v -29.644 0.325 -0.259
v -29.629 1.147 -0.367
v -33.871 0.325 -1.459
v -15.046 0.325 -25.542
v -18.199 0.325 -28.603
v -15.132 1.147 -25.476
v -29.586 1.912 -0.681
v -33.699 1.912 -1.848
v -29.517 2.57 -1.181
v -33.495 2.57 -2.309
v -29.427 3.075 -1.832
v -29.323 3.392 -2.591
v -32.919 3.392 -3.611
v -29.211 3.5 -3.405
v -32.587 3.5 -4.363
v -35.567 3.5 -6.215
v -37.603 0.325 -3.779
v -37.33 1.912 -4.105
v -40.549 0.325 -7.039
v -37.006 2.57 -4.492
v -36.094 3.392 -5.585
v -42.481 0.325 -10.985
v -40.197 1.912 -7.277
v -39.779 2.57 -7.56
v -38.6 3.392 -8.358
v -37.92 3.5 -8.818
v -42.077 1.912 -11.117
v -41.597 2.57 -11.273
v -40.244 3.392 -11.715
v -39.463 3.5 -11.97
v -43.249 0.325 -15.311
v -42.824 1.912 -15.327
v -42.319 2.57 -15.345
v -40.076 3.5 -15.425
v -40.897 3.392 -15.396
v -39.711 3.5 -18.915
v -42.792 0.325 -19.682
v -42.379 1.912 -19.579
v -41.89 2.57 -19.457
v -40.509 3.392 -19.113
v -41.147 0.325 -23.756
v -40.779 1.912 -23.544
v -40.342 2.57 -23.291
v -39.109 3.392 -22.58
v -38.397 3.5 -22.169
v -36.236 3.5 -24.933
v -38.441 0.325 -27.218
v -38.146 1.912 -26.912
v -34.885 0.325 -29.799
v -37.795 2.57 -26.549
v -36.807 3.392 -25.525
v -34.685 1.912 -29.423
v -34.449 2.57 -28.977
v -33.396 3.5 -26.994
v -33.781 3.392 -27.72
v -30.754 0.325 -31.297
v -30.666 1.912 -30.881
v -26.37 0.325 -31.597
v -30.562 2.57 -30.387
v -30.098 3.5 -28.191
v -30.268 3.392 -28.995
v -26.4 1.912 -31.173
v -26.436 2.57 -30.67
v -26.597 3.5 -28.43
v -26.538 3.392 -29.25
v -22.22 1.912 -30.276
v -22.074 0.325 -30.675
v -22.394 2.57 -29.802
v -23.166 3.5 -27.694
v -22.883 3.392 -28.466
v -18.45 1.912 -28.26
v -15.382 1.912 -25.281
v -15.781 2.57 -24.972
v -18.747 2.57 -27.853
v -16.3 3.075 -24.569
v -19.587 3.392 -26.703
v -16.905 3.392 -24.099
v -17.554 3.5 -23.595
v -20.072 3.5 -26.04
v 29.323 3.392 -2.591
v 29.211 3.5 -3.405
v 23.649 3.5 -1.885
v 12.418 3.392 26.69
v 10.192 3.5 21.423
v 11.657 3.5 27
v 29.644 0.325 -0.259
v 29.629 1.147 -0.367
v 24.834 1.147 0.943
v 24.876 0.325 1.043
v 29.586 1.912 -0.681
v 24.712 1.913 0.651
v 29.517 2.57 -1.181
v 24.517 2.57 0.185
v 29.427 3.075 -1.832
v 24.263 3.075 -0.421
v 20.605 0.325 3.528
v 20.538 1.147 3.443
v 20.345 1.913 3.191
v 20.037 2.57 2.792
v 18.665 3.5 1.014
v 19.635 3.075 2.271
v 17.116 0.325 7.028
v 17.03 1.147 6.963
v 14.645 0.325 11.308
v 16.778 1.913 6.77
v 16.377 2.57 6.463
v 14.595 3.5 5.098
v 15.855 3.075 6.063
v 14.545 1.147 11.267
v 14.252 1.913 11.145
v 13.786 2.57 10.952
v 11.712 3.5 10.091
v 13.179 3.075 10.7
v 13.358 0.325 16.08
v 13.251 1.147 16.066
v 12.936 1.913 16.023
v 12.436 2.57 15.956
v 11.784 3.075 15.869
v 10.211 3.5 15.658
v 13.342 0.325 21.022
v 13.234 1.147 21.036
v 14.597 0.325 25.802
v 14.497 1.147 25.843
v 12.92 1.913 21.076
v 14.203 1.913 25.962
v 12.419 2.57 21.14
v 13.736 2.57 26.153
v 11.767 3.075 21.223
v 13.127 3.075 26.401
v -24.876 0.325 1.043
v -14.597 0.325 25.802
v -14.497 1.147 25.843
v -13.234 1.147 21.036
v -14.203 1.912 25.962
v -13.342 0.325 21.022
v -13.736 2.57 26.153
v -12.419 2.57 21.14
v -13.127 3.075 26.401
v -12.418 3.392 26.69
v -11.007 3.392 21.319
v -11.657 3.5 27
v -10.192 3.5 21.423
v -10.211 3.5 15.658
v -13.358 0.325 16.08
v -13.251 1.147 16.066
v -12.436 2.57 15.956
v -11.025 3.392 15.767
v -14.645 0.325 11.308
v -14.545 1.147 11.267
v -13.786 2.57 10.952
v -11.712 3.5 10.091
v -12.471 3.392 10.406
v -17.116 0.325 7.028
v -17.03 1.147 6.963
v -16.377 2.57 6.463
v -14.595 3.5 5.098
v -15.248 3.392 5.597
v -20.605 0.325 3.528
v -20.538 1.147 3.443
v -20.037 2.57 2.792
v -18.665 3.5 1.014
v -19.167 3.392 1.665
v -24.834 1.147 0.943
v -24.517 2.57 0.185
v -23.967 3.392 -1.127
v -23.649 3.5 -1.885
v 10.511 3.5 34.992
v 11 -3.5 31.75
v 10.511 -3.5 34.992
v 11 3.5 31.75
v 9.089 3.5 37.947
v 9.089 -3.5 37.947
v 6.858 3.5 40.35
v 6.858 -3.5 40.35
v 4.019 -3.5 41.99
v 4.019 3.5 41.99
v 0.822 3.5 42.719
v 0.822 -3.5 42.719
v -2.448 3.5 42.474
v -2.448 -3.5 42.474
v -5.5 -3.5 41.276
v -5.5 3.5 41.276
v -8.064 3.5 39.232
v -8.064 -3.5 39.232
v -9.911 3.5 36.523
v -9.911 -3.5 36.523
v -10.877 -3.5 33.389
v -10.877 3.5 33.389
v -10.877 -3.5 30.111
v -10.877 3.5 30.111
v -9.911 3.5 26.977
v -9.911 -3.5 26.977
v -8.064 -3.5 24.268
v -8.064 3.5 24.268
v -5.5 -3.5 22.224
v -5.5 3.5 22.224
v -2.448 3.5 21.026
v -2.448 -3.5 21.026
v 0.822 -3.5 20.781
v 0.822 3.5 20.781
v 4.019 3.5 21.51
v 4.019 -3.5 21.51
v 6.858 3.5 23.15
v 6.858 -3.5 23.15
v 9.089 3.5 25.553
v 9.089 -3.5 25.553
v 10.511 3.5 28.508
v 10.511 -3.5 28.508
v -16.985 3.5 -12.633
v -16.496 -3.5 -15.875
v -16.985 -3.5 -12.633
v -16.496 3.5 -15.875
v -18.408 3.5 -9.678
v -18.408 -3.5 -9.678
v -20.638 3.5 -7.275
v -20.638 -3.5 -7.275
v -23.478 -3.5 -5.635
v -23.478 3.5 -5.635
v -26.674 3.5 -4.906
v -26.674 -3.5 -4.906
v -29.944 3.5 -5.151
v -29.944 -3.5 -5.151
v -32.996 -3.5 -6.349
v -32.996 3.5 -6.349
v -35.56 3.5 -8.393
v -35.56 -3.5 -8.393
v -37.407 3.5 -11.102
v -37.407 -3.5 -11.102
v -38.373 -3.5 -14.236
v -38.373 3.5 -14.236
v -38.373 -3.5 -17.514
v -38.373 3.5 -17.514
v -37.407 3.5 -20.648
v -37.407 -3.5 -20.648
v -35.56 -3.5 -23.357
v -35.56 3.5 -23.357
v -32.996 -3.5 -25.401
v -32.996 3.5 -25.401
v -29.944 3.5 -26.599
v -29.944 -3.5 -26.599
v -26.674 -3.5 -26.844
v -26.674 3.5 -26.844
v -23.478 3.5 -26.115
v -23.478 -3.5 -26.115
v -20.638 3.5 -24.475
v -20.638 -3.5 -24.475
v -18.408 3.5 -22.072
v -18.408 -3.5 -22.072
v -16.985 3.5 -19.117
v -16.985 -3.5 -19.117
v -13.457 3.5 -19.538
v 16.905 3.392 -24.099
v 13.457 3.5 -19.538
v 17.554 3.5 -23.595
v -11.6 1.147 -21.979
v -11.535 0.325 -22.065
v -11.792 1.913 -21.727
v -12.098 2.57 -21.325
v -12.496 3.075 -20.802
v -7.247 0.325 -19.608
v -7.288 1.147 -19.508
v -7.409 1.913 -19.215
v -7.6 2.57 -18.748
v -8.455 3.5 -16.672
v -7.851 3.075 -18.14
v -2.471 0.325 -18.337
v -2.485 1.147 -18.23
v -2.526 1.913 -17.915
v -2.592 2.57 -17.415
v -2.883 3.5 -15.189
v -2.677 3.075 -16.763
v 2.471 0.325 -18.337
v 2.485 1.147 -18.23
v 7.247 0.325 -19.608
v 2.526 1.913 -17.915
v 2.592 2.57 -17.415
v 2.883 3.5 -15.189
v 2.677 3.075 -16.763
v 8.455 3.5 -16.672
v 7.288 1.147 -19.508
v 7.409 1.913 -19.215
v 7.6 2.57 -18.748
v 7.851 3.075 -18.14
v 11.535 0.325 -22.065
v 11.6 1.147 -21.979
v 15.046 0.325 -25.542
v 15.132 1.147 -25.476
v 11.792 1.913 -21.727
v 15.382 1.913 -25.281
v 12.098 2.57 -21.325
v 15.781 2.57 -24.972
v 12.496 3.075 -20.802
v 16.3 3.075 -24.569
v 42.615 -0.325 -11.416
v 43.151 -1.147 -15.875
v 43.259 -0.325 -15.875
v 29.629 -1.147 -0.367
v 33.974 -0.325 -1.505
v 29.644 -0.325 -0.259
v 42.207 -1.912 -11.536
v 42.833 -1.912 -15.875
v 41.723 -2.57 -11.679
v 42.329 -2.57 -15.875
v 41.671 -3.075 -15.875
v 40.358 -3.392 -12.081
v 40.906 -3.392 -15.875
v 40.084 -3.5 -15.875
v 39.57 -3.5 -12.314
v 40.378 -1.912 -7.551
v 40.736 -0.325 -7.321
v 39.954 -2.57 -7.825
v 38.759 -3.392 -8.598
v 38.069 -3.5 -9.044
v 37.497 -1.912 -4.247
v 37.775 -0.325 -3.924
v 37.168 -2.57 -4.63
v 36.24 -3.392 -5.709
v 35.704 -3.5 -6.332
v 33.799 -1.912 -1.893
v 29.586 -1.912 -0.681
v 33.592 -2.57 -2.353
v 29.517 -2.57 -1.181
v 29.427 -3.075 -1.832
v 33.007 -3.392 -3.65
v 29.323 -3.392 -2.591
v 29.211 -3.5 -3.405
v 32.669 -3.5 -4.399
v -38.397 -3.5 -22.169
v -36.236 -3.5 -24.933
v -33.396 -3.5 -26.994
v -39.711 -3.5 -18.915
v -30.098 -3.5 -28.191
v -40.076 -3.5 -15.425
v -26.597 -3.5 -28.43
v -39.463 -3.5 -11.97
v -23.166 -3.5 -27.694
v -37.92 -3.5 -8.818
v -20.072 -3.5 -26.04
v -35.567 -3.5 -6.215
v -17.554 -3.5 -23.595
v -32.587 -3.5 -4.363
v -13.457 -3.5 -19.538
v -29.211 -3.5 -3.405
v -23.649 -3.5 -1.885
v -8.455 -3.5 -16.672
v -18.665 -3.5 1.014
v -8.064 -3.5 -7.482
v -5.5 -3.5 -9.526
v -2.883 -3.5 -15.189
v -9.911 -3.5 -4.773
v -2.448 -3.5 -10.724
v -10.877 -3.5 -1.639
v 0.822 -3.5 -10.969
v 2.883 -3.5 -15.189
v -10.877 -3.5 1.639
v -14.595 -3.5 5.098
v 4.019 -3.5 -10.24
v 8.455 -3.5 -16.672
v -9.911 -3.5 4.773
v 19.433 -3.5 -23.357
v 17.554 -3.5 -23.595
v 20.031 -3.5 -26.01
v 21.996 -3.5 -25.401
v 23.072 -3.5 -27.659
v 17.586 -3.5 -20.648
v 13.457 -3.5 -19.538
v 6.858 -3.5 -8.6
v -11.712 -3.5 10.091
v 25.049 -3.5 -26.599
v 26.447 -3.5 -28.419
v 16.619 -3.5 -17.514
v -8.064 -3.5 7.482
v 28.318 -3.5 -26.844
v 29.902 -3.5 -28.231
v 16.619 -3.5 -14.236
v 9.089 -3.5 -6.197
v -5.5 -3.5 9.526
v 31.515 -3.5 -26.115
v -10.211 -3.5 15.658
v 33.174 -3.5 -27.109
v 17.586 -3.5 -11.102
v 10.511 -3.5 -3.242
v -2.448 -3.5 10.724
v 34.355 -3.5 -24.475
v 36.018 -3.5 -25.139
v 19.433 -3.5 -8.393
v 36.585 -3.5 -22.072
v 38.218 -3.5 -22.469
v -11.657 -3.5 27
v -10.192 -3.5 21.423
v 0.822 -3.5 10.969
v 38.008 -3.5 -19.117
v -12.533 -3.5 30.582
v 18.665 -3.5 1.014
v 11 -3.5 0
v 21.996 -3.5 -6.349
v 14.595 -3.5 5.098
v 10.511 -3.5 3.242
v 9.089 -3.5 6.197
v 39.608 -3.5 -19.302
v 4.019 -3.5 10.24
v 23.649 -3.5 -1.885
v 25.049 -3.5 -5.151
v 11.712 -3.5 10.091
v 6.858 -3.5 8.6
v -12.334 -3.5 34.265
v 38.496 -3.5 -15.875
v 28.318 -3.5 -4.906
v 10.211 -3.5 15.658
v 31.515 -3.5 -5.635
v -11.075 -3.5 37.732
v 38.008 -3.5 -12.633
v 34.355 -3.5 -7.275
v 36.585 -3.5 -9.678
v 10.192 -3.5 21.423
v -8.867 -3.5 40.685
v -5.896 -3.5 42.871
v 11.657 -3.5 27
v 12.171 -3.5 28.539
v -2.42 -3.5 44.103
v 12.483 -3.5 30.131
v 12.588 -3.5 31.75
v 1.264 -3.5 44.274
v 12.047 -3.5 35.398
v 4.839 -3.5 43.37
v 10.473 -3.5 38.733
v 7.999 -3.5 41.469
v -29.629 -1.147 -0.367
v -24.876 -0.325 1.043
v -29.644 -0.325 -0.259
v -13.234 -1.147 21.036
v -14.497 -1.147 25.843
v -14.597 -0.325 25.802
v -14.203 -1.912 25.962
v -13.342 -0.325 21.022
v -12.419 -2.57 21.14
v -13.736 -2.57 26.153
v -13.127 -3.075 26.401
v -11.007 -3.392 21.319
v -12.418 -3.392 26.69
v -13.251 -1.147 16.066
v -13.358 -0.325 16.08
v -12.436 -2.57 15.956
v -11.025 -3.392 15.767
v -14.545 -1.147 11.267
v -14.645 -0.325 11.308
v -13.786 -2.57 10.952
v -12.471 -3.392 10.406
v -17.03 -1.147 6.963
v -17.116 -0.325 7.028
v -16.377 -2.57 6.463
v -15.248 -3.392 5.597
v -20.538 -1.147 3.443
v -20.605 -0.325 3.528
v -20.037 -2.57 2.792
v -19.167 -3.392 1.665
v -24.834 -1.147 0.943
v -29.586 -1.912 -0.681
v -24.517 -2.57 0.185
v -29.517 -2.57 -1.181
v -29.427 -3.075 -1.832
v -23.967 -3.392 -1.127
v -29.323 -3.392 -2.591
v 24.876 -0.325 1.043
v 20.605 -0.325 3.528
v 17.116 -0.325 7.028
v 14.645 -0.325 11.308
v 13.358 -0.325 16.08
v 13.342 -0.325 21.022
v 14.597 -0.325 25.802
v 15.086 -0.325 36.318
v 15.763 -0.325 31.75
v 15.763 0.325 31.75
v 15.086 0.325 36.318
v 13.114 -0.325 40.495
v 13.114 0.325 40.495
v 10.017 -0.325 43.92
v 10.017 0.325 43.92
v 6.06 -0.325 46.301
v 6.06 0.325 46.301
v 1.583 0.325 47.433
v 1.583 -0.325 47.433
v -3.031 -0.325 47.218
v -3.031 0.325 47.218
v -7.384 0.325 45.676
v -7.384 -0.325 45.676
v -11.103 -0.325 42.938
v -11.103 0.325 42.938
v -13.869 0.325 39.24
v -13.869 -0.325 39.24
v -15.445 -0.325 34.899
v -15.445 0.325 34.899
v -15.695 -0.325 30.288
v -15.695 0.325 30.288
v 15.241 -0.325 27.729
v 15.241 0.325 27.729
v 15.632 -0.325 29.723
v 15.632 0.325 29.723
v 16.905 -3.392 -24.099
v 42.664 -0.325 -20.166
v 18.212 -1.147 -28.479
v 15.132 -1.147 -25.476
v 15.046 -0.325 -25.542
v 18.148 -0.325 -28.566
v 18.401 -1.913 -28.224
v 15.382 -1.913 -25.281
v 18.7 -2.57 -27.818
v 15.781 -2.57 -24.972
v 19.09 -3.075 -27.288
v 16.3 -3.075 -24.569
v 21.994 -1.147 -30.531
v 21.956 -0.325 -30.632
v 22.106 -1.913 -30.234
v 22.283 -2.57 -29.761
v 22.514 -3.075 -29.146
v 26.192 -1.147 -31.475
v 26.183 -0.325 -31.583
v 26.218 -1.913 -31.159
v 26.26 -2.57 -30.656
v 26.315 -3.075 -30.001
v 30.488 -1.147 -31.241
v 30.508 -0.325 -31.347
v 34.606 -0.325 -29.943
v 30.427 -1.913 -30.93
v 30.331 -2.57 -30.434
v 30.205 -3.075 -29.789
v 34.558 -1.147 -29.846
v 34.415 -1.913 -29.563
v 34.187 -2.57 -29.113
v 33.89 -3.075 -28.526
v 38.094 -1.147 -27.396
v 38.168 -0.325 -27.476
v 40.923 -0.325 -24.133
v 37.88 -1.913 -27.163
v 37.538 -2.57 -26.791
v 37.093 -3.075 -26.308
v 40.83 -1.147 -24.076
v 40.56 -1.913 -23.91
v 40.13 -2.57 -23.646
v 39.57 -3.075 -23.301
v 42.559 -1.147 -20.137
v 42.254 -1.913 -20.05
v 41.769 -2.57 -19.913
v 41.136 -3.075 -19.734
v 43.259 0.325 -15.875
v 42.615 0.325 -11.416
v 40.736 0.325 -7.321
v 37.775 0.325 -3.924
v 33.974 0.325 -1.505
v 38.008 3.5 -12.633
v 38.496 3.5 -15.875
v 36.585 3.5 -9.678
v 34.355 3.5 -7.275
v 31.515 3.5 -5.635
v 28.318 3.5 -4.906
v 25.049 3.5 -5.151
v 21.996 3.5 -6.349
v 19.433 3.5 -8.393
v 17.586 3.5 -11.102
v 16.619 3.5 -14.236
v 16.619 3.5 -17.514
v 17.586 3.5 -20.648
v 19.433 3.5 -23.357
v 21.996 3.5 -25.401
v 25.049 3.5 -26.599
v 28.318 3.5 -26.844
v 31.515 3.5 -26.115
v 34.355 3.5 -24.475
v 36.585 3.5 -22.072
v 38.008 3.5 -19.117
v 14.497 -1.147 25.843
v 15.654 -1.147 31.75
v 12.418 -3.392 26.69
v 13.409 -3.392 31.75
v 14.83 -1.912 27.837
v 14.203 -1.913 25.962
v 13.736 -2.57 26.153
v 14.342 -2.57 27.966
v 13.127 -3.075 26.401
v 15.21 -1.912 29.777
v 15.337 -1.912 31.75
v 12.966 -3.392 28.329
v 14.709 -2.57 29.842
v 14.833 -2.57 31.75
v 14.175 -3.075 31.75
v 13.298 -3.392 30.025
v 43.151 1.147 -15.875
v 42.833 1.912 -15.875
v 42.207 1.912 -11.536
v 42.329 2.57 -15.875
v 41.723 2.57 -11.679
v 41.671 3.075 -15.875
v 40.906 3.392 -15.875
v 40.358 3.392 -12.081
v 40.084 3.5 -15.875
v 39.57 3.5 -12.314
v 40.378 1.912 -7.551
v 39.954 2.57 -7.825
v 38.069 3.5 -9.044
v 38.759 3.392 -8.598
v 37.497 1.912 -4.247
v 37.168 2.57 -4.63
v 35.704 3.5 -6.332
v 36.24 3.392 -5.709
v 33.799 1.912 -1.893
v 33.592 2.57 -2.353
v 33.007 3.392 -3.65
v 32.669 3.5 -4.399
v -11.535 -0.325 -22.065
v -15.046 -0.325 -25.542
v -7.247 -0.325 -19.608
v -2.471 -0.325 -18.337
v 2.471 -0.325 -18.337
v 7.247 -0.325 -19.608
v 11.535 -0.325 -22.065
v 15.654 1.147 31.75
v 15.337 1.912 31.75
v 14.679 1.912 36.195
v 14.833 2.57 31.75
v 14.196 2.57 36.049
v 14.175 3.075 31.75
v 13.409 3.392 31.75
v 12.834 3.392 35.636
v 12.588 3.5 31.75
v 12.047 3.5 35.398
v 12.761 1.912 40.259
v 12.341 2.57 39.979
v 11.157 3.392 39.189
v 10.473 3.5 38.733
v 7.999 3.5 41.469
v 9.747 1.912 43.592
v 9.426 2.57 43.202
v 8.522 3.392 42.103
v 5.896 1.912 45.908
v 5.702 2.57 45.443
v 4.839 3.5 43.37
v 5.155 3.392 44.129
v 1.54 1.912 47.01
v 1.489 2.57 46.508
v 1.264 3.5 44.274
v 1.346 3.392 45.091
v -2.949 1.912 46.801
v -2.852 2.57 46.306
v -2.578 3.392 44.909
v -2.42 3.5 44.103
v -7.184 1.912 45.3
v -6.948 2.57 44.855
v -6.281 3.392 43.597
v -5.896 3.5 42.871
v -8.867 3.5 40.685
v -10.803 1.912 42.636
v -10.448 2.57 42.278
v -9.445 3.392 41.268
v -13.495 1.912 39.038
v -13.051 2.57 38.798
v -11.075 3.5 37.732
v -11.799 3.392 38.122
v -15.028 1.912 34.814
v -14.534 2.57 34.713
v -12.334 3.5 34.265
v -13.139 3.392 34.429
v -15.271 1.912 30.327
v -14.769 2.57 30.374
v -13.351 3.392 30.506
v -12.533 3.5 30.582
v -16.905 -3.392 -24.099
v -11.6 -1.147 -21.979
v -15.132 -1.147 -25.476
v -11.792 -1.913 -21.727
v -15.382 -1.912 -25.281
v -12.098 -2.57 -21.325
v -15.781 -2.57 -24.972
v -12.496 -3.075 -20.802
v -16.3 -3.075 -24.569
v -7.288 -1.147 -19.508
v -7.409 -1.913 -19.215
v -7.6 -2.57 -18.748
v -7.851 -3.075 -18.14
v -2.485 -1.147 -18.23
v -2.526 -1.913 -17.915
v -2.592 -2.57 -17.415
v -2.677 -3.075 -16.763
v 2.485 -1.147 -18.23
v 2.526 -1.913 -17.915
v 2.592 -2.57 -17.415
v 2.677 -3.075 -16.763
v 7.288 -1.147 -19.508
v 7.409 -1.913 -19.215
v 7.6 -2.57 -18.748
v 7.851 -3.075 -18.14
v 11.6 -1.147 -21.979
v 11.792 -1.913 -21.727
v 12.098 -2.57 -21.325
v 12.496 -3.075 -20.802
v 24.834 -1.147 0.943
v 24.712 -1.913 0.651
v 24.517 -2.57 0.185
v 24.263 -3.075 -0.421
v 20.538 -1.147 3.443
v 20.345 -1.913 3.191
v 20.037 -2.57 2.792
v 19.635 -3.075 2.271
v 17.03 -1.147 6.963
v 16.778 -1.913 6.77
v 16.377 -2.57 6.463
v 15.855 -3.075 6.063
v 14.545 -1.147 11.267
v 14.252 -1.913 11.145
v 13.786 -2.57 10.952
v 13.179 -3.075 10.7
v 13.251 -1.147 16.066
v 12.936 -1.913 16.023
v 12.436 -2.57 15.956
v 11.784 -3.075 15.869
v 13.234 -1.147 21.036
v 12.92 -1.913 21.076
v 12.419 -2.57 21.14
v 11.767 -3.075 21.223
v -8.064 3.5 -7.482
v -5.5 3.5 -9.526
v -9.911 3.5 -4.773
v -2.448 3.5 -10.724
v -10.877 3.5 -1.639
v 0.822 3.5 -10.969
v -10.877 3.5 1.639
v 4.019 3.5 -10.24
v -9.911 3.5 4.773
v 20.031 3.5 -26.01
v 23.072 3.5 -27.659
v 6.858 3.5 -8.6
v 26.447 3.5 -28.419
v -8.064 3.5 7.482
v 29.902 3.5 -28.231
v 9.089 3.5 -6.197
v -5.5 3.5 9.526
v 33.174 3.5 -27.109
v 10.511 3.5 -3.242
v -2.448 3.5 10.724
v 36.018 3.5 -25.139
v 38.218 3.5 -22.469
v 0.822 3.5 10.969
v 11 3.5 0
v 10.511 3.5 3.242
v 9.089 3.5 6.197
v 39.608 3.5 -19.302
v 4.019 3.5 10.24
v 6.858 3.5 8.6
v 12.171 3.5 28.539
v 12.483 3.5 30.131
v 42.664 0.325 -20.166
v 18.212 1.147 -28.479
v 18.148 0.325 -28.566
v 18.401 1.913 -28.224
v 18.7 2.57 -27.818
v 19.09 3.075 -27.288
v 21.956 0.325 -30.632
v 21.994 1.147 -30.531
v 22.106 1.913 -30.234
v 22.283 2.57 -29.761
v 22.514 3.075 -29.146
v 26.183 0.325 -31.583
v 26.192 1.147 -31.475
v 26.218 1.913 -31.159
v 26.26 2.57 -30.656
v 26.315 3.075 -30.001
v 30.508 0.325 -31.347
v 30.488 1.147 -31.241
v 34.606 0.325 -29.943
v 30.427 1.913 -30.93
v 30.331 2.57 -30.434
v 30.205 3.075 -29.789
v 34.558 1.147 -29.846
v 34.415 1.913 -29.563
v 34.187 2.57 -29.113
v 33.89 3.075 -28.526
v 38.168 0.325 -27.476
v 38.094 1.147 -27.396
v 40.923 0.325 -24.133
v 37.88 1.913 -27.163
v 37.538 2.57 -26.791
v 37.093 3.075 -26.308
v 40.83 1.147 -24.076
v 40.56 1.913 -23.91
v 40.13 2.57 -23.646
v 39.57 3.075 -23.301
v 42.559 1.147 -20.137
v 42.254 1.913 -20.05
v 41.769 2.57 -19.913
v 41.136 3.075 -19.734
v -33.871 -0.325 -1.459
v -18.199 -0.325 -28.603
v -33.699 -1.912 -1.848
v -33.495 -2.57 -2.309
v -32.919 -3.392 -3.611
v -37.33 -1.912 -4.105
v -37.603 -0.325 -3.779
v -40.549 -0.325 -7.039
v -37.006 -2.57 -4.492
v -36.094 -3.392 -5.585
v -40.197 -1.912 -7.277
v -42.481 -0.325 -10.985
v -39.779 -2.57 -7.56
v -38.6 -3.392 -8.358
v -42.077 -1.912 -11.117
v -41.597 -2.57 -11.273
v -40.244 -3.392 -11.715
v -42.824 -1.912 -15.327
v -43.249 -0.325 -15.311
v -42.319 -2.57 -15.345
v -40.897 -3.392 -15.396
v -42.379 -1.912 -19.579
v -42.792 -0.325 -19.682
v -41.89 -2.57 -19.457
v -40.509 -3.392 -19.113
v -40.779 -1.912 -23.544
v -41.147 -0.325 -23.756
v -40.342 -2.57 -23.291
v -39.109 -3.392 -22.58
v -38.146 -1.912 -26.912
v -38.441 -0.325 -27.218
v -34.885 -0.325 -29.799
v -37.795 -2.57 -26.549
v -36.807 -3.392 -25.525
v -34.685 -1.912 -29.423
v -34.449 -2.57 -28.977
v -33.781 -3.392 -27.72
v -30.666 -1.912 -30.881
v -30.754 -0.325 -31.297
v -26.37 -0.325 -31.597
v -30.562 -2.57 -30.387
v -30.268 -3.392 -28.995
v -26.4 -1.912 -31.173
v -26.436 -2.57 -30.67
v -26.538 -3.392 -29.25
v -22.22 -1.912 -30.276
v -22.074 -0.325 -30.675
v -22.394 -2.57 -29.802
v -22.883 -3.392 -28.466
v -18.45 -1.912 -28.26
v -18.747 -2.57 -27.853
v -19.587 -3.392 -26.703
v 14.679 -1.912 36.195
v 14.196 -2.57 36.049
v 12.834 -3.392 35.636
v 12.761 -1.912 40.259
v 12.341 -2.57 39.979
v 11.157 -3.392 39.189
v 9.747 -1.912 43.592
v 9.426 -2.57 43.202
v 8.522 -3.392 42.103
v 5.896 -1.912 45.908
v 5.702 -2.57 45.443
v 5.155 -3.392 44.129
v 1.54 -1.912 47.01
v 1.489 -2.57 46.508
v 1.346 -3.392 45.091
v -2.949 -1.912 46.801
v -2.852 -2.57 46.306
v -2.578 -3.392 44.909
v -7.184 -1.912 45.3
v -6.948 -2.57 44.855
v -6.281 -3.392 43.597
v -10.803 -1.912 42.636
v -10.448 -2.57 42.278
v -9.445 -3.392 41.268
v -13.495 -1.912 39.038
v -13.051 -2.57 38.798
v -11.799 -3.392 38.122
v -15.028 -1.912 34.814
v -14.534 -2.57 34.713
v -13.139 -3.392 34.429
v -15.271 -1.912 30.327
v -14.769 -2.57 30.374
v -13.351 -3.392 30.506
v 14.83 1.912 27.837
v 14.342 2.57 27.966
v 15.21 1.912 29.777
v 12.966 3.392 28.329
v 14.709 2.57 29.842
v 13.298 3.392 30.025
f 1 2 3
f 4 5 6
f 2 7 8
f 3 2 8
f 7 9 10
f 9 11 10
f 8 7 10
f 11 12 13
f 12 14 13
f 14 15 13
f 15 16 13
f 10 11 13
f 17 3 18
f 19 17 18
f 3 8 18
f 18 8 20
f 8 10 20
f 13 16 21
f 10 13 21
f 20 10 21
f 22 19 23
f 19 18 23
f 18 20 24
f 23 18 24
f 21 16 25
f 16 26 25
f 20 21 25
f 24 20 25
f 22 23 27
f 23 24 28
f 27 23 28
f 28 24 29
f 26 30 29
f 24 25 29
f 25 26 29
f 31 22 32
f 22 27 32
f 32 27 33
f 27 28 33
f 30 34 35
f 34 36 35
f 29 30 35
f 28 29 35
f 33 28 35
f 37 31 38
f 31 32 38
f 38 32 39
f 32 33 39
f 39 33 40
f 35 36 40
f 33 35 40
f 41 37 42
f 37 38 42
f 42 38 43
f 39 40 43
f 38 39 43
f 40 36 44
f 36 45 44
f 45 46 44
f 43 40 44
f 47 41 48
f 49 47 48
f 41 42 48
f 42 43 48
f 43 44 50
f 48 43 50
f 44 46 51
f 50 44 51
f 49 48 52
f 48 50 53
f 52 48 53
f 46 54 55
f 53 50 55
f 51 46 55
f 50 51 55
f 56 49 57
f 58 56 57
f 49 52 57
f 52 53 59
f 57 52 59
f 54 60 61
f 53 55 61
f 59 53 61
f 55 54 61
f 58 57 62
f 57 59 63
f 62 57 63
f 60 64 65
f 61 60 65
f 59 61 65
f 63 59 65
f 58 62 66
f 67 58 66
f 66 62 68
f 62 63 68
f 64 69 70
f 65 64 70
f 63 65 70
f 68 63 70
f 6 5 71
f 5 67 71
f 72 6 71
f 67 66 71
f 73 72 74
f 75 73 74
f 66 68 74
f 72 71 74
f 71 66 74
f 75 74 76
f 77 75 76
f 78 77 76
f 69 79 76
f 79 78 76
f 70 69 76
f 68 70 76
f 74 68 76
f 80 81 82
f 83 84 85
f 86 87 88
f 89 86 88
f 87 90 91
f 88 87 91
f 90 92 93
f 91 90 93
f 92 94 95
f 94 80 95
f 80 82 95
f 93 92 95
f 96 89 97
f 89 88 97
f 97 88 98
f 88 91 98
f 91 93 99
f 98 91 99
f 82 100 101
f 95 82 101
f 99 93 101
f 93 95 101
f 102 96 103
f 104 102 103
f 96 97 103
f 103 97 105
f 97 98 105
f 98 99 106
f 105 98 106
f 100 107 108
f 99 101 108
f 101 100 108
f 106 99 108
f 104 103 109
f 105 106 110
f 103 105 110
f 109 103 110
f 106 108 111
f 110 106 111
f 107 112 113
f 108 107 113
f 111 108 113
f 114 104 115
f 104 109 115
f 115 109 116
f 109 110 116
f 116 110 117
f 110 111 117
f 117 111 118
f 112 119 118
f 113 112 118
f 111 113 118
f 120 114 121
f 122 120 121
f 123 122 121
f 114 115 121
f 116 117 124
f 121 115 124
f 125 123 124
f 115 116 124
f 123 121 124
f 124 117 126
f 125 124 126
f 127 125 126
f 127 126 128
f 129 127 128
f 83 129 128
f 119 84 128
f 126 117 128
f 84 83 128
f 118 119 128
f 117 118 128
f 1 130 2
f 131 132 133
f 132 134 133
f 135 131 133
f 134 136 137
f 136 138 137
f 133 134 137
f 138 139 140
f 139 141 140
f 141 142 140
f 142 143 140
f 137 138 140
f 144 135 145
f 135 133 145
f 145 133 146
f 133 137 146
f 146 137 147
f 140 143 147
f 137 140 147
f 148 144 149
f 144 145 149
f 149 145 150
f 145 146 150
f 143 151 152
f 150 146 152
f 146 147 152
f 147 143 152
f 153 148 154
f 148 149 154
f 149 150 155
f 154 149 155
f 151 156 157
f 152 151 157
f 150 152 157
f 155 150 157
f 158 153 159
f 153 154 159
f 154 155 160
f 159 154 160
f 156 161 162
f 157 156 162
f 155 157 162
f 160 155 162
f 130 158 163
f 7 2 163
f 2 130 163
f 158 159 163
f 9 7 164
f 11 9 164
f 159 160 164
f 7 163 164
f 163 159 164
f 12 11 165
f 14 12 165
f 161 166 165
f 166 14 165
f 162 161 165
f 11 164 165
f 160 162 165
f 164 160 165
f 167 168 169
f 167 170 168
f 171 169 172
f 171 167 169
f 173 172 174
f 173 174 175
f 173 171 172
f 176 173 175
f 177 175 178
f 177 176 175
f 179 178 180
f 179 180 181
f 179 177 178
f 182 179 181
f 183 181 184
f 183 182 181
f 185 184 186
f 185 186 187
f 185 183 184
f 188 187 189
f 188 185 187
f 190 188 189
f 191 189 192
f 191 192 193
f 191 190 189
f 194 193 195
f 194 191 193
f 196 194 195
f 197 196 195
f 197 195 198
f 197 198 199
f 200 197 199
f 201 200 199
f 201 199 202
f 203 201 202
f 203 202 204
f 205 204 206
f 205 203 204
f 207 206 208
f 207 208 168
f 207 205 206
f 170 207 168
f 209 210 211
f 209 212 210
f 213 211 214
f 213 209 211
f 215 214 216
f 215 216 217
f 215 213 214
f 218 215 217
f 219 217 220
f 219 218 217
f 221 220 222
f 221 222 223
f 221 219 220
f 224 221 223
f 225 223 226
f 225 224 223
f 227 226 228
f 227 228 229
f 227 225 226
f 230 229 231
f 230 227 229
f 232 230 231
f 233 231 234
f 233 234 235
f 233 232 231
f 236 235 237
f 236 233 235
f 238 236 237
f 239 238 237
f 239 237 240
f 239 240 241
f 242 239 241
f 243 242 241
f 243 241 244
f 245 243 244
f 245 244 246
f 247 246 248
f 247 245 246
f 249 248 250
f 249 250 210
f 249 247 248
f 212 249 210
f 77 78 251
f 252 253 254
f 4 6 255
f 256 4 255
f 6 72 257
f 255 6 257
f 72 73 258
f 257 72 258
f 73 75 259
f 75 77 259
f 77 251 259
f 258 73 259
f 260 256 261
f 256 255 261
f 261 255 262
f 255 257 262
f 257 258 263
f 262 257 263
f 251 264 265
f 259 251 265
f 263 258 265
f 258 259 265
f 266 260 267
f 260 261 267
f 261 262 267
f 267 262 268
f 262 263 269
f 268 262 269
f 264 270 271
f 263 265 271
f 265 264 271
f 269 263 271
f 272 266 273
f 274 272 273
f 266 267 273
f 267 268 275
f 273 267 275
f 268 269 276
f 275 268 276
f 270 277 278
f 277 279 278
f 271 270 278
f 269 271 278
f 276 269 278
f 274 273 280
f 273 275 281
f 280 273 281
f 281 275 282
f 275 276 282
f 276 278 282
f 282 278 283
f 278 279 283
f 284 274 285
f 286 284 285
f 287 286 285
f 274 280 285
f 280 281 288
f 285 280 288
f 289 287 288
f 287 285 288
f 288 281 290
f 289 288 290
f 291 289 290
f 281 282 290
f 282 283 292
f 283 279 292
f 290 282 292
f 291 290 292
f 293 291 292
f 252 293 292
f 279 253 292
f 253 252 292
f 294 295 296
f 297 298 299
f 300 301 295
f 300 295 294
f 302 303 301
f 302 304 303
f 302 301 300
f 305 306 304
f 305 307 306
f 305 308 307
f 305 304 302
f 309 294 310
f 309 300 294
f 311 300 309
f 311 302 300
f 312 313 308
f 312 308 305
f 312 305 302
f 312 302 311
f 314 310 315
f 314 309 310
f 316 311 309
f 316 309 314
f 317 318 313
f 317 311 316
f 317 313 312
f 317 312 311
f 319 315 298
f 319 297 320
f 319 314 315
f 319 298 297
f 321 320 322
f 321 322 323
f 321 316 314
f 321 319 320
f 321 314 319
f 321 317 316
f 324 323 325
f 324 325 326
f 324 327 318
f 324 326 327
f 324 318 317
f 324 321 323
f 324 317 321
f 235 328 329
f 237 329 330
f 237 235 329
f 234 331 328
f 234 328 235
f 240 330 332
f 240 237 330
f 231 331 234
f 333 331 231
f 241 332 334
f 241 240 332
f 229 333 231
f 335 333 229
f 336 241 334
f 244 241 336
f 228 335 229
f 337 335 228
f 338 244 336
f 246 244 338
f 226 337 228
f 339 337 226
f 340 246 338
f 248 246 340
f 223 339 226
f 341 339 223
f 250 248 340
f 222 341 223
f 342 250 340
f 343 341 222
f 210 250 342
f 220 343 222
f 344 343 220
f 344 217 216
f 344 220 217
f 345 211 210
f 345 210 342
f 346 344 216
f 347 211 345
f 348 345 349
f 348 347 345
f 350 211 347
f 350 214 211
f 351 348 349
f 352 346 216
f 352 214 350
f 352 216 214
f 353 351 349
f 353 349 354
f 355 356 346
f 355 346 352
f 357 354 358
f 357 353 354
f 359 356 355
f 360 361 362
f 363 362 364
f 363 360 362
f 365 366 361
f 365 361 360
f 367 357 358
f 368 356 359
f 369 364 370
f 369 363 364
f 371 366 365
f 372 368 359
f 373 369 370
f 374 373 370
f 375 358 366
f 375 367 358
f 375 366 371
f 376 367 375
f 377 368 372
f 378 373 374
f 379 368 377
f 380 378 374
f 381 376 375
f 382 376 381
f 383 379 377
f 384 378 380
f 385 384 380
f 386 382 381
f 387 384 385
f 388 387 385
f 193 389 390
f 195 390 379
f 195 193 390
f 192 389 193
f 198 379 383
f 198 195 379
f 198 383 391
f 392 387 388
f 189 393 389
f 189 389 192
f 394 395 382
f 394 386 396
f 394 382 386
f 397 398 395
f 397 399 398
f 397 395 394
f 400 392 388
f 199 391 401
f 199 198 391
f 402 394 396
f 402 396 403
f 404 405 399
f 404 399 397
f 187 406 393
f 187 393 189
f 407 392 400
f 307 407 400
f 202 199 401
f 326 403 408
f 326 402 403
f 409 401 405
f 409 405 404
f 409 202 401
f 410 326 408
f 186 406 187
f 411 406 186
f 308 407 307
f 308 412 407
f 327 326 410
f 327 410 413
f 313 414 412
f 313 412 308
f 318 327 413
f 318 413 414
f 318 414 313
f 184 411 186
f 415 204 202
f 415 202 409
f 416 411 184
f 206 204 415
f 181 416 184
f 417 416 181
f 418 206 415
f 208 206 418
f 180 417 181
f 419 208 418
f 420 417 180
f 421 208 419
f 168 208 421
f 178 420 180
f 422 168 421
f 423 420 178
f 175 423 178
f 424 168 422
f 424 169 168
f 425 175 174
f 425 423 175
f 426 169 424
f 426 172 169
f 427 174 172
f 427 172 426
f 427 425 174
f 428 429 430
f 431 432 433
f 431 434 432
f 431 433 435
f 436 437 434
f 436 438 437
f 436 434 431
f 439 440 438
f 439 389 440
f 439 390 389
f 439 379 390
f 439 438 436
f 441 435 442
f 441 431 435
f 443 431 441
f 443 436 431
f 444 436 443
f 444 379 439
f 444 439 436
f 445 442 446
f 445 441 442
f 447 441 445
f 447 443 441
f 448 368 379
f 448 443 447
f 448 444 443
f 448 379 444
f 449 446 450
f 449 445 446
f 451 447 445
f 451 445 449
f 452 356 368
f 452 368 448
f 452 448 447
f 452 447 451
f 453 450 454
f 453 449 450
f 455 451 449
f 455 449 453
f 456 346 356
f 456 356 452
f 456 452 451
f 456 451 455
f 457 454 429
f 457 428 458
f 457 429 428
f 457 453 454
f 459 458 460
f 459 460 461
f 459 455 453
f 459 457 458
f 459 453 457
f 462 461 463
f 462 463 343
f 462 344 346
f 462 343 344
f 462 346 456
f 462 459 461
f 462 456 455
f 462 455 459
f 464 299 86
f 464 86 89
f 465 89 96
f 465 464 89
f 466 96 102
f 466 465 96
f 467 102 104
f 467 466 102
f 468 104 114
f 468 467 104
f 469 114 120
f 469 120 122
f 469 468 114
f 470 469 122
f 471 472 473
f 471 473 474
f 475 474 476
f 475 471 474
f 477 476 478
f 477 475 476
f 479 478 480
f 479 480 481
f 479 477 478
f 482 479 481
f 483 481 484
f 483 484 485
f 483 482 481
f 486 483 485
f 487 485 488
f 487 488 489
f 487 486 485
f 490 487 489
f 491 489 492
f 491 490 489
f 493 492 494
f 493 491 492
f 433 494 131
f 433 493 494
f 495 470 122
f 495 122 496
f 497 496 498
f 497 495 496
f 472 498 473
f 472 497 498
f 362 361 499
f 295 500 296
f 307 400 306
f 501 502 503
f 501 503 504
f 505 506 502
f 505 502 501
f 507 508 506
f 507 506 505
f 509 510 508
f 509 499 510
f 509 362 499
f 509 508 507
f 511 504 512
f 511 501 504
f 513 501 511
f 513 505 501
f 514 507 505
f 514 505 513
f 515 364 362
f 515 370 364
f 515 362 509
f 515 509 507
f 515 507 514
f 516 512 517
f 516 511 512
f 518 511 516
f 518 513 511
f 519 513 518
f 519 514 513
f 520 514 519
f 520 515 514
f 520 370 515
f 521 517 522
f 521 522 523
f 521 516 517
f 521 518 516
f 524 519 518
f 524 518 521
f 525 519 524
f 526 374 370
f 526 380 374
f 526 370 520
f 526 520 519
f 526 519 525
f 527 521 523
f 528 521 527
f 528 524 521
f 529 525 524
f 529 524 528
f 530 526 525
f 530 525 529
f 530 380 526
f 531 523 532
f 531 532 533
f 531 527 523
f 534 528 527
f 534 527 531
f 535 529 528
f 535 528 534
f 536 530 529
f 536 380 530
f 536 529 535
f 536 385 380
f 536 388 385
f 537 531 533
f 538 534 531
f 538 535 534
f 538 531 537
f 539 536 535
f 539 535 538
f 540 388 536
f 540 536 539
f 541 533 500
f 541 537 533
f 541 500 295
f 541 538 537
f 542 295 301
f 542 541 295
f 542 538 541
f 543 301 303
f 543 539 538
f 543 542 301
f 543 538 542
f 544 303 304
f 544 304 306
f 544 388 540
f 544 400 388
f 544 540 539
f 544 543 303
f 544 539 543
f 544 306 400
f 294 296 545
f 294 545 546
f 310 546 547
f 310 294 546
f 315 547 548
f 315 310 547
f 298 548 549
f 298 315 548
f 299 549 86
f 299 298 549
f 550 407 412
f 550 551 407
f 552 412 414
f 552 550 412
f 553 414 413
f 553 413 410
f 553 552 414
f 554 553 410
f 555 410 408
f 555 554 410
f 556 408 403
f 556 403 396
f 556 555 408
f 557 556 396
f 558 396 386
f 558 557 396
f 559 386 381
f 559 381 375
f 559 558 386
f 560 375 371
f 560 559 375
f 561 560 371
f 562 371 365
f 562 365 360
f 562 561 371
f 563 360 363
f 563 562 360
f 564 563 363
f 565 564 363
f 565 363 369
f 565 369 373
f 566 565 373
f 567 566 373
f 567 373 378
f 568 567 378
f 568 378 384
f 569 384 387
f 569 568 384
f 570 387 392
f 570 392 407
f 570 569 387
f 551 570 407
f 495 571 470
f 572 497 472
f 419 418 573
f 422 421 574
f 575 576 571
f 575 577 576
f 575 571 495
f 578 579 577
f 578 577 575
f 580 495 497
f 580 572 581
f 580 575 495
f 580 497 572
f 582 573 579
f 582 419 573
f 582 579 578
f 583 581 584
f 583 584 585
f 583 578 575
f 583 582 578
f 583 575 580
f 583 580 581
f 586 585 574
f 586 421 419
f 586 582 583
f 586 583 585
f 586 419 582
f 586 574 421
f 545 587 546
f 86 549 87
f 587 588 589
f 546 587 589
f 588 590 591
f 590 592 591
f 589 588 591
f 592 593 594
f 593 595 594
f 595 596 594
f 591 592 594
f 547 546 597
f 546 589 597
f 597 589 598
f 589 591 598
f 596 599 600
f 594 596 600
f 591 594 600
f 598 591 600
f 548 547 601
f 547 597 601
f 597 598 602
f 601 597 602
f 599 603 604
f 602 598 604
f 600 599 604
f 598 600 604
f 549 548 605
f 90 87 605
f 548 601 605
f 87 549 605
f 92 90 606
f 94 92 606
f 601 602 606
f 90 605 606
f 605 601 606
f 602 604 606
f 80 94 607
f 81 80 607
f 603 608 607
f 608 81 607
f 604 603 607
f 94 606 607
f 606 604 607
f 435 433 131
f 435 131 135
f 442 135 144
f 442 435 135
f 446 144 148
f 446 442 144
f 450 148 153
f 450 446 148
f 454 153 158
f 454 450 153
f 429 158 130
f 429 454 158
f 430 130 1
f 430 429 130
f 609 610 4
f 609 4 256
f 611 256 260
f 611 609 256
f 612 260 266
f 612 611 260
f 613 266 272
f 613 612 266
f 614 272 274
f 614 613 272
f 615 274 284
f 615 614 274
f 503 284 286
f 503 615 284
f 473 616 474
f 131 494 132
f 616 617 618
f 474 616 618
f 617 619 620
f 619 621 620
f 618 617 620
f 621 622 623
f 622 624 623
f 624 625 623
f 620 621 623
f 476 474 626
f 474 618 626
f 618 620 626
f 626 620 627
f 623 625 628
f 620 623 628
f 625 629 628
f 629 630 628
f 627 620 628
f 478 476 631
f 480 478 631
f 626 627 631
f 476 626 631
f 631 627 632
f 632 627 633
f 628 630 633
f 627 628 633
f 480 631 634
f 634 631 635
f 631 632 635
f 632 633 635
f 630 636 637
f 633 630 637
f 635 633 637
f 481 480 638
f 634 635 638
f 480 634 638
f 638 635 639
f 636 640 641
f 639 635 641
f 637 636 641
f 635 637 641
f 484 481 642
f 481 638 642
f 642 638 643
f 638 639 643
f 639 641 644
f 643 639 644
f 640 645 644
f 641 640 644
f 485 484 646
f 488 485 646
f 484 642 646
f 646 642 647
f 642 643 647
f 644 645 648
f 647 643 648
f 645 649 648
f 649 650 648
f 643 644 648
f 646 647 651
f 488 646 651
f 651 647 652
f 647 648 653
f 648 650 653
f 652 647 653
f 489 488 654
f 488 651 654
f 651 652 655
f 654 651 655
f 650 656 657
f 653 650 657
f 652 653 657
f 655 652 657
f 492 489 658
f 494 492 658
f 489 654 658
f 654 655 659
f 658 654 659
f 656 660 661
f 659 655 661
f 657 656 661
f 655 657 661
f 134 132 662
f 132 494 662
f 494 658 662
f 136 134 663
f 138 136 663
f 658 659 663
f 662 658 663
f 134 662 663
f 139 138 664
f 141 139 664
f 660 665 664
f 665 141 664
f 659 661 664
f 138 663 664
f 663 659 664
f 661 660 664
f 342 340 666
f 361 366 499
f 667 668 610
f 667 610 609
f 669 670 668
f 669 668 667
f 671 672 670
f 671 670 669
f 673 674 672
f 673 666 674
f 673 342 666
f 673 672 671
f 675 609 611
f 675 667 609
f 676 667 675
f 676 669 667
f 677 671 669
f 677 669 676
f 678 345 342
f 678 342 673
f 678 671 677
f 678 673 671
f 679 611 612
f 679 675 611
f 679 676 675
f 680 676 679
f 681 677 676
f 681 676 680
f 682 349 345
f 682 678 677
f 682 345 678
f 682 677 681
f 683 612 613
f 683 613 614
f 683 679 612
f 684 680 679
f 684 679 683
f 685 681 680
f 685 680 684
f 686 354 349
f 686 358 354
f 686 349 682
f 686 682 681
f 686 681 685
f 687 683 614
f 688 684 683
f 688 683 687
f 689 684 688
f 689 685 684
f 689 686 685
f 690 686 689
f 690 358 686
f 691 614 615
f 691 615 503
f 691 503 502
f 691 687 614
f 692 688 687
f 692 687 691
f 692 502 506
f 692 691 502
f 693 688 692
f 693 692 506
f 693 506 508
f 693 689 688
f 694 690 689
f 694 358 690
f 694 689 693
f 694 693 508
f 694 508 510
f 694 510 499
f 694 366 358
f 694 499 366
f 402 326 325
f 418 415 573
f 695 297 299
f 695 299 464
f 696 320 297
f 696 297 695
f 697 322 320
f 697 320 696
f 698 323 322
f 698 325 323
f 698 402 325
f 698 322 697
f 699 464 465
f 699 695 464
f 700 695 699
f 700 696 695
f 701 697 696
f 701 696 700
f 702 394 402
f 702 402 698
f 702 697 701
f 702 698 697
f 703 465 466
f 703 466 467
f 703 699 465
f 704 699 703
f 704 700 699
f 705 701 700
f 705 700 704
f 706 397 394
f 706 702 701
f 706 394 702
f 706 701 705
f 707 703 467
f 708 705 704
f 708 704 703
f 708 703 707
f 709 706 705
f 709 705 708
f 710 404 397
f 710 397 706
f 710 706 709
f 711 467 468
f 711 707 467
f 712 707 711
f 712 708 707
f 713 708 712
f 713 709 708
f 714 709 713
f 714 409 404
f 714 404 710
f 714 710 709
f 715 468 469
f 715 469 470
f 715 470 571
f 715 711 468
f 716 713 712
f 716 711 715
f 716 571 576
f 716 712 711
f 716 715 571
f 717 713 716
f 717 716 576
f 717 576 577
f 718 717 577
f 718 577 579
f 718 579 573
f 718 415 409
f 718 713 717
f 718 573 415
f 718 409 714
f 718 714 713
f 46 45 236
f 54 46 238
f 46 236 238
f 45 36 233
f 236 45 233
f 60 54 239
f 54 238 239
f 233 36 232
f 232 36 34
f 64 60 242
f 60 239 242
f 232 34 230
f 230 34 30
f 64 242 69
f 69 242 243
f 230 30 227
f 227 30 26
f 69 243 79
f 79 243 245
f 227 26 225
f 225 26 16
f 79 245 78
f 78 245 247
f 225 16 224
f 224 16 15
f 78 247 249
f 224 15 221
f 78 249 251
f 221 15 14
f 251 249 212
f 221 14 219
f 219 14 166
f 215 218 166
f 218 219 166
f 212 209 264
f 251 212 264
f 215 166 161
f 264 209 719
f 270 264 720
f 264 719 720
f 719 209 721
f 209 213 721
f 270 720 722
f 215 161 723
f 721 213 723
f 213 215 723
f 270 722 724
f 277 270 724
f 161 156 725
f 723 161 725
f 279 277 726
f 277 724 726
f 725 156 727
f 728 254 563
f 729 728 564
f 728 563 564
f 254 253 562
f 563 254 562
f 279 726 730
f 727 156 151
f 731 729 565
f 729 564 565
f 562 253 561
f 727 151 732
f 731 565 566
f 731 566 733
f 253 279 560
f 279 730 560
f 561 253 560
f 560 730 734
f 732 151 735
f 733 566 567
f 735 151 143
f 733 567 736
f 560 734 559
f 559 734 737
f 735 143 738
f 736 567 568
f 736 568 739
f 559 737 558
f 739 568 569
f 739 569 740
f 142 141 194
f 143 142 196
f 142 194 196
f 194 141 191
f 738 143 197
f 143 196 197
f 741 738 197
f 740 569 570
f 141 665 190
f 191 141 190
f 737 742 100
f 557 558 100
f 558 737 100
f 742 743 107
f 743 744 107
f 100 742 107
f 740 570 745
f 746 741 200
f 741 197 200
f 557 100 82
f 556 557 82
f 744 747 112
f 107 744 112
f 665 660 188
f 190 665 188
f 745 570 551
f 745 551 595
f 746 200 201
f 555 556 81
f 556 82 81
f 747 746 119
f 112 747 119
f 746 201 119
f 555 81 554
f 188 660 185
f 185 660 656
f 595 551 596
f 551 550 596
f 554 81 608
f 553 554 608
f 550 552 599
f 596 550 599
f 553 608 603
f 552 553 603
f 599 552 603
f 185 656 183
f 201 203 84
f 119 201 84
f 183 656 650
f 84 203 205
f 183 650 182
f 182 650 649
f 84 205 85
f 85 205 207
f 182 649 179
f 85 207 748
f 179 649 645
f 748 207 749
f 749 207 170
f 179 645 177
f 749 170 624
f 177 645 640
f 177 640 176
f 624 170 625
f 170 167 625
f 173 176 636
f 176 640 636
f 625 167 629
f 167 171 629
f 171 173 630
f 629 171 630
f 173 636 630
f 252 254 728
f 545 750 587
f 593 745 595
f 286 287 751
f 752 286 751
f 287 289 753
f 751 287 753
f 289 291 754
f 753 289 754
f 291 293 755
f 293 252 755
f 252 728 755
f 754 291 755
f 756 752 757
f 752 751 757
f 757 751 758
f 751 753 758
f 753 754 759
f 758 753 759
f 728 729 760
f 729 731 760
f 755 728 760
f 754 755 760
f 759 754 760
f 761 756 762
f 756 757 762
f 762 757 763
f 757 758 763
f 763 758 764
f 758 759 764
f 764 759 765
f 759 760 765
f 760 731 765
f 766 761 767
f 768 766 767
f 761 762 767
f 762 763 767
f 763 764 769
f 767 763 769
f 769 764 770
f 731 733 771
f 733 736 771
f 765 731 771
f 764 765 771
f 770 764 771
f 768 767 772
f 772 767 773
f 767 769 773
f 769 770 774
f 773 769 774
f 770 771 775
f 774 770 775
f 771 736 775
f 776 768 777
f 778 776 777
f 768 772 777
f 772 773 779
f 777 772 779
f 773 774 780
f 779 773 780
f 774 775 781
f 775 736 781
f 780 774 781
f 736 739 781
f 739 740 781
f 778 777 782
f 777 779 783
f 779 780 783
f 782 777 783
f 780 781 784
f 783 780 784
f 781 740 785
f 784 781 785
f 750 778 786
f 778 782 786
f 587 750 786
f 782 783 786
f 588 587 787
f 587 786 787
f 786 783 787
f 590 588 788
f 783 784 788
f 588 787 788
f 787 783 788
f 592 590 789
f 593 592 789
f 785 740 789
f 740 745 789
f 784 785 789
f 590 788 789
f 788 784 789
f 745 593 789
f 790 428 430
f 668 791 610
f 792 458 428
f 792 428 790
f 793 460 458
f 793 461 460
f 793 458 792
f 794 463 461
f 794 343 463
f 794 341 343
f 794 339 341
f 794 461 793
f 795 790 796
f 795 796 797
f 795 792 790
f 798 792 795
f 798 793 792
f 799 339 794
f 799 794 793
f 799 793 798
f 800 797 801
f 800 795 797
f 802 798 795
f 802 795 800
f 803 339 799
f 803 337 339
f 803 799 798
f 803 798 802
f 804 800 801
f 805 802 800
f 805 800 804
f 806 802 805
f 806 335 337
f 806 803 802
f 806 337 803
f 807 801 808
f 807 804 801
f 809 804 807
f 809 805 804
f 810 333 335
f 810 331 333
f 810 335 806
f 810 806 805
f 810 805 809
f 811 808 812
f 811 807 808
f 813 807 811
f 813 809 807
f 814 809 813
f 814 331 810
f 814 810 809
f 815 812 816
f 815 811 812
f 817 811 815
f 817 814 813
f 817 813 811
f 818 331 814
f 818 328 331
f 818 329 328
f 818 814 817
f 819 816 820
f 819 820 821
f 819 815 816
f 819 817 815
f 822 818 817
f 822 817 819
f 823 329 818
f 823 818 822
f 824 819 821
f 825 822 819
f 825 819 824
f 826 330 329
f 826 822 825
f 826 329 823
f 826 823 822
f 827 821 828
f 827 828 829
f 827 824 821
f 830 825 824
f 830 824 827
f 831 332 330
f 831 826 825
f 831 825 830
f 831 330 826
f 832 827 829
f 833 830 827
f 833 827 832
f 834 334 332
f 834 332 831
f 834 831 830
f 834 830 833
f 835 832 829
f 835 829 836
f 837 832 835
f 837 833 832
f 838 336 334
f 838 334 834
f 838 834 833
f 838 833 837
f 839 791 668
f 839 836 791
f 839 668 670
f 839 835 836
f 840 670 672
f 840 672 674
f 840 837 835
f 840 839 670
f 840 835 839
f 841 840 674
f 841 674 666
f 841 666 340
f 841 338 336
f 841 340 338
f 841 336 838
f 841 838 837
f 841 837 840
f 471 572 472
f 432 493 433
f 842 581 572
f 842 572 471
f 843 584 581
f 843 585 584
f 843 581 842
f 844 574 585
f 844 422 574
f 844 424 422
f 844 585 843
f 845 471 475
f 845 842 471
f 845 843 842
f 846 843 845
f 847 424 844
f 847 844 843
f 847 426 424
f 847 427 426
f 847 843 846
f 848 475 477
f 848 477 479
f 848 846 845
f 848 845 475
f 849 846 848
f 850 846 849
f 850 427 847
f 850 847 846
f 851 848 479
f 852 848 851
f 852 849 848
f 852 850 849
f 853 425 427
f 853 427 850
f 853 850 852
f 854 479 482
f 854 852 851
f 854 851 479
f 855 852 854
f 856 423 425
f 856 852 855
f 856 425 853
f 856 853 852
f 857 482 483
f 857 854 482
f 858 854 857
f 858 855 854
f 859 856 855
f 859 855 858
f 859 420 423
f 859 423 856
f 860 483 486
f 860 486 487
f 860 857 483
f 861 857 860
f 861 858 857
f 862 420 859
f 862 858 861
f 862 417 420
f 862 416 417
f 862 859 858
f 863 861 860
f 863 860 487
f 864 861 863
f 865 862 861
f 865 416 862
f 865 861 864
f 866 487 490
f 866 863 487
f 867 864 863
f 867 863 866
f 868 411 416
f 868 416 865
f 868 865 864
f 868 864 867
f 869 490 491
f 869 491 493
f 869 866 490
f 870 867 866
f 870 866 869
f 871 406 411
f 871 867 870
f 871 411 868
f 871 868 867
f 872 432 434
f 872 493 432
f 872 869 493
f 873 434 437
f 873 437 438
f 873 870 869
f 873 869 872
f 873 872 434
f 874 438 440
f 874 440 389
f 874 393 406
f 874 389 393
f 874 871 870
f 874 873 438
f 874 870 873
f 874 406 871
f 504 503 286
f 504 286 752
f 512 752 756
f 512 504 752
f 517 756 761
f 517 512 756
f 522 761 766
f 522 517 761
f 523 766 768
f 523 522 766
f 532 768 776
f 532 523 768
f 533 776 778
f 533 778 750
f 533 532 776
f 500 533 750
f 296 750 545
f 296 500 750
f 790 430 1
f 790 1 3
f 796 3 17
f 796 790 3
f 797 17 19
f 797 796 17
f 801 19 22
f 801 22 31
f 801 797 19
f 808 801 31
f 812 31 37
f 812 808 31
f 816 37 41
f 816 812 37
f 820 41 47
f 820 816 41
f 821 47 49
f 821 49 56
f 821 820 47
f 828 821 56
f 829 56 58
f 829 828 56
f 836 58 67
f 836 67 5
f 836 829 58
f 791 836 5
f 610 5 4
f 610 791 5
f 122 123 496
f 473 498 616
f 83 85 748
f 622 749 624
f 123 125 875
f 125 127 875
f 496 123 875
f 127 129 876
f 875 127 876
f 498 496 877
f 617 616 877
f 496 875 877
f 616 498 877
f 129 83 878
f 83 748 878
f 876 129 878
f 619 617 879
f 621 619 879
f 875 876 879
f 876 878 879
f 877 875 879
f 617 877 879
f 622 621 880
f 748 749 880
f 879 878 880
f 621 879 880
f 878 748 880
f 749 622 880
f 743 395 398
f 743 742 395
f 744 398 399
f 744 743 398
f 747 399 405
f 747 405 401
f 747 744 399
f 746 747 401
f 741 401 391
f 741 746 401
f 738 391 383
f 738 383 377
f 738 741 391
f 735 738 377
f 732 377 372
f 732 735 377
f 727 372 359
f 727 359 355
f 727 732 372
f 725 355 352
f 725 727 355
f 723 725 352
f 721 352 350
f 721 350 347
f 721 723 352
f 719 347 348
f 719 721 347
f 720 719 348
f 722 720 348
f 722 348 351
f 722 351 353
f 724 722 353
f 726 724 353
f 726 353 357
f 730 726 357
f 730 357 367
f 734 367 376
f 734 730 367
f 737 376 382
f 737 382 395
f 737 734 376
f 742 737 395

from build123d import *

# Parameters (mm, degrees)
F0_R     = 11
F1_DEPTH = 3.5
F2_R     = 3.175


with BuildPart() as f1:
    # F0 (on Front) → F1 (new body, symmetric)
    with BuildSketch(Plane.XZ):
        with BuildLine():
            ThreePointArc((14.597093, 25.801783), (15.468405, 28.719346), (15.7625, 31.75))
            ThreePointArc((15.7625, 31.75), (-3.030654, 47.218405), (-14.597093, 25.801783))
            ThreePointArc((-14.597093, 25.801783), (0, 15.9875), (14.597093, 25.801783))
        make_face()
        with Locations((0, 31.75)):
            Circle(F0_R, mode=Mode.SUBTRACT)
        with BuildLine():
            ThreePointArc((14.597093, 25.801783), (0, 15.9875), (-14.597093, 25.801783))
            ThreePointArc((-14.597093, 25.801783), (-15.740839, 9.087978), (-29.643546, -0.259438))
            ThreePointArc((-29.643546, -0.259438), (-17.137481, -3.994296), (-11.733807, -15.875))
            ThreePointArc((-11.733807, -15.875), (-12.584948, -20.984579), (-15.046453, -25.542344))
            ThreePointArc((-15.046453, -25.542344), (0, -18.175955), (15.046453, -25.542344))
            ThreePointArc((15.046453, -25.542344), (13.845581, -7.99375), (29.643546, -0.259438))
            ThreePointArc((29.643546, -0.259438), (15.740839, 9.087978), (14.597093, 25.801783))
        make_face()
        Circle(F0_R, mode=Mode.SUBTRACT)
        with BuildLine():
            ThreePointArc((-11.733807, -15.875), (-17.137481, -3.994296), (-29.643546, -0.259438))
            ThreePointArc((-29.643546, -0.259438), (-41.147032, -23.75625), (-15.046453, -25.542344))
            ThreePointArc((-15.046453, -25.542344), (-12.584948, -20.984579), (-11.733807, -15.875))
        make_face()
        with Locations((-27.496307, -15.875)):
            Circle(F0_R, mode=Mode.SUBTRACT)
        with BuildLine():
            ThreePointArc((43.258807, -15.875), (39.377011, -5.516174), (29.643546, -0.259438))
            ThreePointArc((29.643546, -0.259438), (13.845581, -7.99375), (15.046453, -25.542344))
            ThreePointArc((15.046453, -25.542344), (32.605885, -30.786359), (43.258807, -15.875))
        make_face()
        with Locations((27.496307, -15.875)):
            Circle(F0_R, mode=Mode.SUBTRACT)
    extrude(amount=F1_DEPTH, both=True)

    # F2
    f2_edges = [f1.edges().sort_by_distance(p)[0] for p in [
        (-41.147032, -3.5, -23.75625),
        (-41.147032, 3.5, -23.75625),
    ]]
    fillet(f2_edges, radius=F2_R)


solid = f1.part
